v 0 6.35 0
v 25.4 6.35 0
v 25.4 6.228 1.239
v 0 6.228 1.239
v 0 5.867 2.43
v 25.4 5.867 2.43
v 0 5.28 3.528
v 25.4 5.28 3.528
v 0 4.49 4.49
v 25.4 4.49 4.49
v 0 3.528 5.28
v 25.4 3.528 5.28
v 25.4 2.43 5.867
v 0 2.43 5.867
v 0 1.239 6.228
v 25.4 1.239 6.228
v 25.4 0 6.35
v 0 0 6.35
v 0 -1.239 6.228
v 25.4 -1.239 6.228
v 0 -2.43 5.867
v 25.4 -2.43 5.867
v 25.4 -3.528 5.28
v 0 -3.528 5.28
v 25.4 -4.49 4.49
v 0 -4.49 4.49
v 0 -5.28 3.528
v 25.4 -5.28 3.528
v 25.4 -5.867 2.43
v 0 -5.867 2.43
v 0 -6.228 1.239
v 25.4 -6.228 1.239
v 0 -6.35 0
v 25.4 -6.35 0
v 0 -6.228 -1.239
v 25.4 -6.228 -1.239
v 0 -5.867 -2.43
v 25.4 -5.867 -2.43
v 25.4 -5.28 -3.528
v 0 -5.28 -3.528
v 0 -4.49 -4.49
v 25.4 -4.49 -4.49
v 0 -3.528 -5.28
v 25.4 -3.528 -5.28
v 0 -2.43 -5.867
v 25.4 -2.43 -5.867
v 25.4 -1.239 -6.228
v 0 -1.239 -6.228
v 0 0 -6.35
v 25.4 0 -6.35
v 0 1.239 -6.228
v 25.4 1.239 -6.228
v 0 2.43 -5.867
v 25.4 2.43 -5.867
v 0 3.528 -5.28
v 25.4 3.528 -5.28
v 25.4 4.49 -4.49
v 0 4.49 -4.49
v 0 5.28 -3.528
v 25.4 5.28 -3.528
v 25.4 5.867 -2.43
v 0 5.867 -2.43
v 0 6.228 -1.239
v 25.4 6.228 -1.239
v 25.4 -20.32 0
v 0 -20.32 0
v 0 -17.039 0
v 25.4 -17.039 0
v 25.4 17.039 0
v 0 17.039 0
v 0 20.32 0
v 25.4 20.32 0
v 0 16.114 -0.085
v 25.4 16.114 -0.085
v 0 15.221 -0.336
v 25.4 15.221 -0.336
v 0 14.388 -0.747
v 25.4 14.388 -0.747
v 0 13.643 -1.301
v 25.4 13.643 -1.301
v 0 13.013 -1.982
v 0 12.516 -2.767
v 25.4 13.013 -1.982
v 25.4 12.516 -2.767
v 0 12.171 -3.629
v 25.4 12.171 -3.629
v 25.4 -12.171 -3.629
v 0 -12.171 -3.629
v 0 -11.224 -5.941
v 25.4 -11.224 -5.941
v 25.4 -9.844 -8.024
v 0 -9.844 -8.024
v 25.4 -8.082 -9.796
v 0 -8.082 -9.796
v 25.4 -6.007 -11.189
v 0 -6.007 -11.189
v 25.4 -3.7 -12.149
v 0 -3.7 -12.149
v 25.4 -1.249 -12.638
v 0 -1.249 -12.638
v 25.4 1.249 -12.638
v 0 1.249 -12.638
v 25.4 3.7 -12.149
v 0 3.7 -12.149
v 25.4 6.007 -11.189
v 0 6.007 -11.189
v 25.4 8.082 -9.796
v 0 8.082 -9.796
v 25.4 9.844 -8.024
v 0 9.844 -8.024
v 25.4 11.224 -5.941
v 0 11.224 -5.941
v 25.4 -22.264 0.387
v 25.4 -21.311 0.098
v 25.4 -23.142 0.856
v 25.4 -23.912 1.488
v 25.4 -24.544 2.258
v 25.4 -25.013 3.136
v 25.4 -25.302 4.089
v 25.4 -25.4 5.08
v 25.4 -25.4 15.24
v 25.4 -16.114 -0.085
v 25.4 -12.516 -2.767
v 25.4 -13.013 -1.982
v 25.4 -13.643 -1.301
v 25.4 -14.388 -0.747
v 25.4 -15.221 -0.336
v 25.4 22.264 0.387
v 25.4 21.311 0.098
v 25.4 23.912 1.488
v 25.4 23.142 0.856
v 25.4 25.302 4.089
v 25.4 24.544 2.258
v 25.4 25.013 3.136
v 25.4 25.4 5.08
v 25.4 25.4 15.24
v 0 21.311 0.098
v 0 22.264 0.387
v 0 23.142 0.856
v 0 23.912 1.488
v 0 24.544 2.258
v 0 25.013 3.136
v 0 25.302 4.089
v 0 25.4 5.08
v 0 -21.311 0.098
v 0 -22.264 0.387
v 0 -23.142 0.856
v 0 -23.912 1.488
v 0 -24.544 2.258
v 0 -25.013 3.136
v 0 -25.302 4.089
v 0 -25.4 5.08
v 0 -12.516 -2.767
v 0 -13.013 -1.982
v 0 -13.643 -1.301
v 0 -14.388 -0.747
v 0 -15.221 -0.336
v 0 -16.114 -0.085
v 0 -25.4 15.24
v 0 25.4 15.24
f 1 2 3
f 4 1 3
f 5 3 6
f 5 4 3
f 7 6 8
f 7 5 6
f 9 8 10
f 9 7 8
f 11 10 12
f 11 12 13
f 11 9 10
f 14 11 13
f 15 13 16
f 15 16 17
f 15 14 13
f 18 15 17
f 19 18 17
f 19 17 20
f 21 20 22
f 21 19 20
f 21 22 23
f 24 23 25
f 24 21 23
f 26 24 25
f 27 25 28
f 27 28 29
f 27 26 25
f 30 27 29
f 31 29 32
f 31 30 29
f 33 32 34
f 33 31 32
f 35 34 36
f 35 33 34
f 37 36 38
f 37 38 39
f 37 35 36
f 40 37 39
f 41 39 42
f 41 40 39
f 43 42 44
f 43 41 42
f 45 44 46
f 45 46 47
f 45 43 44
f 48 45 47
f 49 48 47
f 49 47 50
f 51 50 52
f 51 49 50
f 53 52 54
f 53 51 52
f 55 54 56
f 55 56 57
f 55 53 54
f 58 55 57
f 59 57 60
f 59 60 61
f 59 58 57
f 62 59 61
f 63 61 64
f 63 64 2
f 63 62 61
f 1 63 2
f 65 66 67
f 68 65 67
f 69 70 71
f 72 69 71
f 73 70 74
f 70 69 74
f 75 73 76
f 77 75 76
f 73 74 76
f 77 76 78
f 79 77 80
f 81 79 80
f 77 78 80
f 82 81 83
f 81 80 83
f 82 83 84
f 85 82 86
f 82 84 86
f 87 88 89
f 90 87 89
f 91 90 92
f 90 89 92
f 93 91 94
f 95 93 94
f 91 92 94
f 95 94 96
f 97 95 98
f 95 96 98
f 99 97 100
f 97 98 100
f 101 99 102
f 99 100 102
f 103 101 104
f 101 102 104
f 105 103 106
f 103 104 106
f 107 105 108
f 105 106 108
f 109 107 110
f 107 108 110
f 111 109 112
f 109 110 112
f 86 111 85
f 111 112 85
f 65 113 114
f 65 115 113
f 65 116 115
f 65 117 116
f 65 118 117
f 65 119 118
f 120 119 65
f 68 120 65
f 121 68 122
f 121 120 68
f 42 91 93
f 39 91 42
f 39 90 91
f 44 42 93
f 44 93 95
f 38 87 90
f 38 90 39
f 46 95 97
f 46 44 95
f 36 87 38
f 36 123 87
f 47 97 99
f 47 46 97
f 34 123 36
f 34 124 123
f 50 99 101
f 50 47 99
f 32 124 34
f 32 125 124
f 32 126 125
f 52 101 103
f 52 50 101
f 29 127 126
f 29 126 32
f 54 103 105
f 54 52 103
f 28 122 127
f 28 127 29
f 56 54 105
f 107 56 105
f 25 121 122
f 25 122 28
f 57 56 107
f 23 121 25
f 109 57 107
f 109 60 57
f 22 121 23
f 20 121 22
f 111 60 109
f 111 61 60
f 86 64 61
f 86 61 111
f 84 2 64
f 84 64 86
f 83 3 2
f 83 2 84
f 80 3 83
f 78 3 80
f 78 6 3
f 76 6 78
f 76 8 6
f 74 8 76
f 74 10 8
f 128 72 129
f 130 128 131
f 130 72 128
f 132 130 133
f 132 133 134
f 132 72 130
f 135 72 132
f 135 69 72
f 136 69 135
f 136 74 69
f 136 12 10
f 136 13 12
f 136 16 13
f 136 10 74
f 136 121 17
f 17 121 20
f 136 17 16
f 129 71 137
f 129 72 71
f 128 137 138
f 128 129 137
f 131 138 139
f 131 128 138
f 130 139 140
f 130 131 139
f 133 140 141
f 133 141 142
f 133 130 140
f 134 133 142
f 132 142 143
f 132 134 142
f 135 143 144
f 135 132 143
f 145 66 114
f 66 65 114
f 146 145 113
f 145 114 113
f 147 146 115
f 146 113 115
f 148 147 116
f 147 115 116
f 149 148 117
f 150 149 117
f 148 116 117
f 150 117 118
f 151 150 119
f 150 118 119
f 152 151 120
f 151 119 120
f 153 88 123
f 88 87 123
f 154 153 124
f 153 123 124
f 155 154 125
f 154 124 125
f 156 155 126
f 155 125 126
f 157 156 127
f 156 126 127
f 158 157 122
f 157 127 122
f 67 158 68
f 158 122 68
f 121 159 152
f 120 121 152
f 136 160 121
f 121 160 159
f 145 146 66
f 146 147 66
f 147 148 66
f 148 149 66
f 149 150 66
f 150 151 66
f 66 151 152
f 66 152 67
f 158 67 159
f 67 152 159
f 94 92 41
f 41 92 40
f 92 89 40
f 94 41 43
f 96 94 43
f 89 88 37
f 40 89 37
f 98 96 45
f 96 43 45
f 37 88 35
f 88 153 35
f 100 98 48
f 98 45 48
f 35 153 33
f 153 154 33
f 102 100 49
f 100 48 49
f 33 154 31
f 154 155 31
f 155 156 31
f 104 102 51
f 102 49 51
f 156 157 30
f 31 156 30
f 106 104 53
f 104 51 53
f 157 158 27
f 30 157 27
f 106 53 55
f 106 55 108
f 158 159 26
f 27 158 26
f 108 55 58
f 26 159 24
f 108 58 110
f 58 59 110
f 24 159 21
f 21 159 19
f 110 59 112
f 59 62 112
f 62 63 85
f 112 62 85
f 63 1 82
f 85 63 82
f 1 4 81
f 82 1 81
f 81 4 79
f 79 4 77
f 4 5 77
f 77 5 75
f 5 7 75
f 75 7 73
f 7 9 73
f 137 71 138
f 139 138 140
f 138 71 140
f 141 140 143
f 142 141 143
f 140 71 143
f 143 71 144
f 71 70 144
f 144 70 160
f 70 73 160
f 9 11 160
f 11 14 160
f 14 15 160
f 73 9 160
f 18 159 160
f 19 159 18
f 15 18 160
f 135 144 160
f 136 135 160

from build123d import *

# Parameters (mm, degrees)
F0_R     = 6.35
F1_DEPTH = 25.4
F2_R     = 5.08


with BuildPart() as f1:
    # F0 (on Right) → F1 (new body)
    with BuildSketch(Plane.YZ):
        with BuildLine():
            ThreePointArc((-12.7, 0), (0, 12.7), (12.7, 0))
            Line((12.7, 0), (25.4, 0))
            Line((25.4, 0), (25.4, 15.24))
            Line((25.4, 15.24), (-25.4, 15.24))
            Line((-25.4, 15.24), (-25.4, 0))
            Line((-25.4, 0), (-12.7, 0))
        make_face()
        with BuildLine():
            ThreePointArc((-12.7, 0), (0, -12.7), (12.7, 0))
            ThreePointArc((12.7, 0), (0, 12.7), (-12.7, 0))
        make_face()
        Circle(F0_R, mode=Mode.SUBTRACT)
    extrude(amount=F1_DEPTH)

    # F2
    f2_edges = [f1.edges().sort_by_distance(p)[0] for p in [
        (12.7, -12.7, 0),
        (12.7, 12.7, 0),
        (12.7, 25.4, 0),
        (12.7, -25.4, 0),
    ]]
    fillet(f2_edges, radius=F2_R)


solid = f1.part
